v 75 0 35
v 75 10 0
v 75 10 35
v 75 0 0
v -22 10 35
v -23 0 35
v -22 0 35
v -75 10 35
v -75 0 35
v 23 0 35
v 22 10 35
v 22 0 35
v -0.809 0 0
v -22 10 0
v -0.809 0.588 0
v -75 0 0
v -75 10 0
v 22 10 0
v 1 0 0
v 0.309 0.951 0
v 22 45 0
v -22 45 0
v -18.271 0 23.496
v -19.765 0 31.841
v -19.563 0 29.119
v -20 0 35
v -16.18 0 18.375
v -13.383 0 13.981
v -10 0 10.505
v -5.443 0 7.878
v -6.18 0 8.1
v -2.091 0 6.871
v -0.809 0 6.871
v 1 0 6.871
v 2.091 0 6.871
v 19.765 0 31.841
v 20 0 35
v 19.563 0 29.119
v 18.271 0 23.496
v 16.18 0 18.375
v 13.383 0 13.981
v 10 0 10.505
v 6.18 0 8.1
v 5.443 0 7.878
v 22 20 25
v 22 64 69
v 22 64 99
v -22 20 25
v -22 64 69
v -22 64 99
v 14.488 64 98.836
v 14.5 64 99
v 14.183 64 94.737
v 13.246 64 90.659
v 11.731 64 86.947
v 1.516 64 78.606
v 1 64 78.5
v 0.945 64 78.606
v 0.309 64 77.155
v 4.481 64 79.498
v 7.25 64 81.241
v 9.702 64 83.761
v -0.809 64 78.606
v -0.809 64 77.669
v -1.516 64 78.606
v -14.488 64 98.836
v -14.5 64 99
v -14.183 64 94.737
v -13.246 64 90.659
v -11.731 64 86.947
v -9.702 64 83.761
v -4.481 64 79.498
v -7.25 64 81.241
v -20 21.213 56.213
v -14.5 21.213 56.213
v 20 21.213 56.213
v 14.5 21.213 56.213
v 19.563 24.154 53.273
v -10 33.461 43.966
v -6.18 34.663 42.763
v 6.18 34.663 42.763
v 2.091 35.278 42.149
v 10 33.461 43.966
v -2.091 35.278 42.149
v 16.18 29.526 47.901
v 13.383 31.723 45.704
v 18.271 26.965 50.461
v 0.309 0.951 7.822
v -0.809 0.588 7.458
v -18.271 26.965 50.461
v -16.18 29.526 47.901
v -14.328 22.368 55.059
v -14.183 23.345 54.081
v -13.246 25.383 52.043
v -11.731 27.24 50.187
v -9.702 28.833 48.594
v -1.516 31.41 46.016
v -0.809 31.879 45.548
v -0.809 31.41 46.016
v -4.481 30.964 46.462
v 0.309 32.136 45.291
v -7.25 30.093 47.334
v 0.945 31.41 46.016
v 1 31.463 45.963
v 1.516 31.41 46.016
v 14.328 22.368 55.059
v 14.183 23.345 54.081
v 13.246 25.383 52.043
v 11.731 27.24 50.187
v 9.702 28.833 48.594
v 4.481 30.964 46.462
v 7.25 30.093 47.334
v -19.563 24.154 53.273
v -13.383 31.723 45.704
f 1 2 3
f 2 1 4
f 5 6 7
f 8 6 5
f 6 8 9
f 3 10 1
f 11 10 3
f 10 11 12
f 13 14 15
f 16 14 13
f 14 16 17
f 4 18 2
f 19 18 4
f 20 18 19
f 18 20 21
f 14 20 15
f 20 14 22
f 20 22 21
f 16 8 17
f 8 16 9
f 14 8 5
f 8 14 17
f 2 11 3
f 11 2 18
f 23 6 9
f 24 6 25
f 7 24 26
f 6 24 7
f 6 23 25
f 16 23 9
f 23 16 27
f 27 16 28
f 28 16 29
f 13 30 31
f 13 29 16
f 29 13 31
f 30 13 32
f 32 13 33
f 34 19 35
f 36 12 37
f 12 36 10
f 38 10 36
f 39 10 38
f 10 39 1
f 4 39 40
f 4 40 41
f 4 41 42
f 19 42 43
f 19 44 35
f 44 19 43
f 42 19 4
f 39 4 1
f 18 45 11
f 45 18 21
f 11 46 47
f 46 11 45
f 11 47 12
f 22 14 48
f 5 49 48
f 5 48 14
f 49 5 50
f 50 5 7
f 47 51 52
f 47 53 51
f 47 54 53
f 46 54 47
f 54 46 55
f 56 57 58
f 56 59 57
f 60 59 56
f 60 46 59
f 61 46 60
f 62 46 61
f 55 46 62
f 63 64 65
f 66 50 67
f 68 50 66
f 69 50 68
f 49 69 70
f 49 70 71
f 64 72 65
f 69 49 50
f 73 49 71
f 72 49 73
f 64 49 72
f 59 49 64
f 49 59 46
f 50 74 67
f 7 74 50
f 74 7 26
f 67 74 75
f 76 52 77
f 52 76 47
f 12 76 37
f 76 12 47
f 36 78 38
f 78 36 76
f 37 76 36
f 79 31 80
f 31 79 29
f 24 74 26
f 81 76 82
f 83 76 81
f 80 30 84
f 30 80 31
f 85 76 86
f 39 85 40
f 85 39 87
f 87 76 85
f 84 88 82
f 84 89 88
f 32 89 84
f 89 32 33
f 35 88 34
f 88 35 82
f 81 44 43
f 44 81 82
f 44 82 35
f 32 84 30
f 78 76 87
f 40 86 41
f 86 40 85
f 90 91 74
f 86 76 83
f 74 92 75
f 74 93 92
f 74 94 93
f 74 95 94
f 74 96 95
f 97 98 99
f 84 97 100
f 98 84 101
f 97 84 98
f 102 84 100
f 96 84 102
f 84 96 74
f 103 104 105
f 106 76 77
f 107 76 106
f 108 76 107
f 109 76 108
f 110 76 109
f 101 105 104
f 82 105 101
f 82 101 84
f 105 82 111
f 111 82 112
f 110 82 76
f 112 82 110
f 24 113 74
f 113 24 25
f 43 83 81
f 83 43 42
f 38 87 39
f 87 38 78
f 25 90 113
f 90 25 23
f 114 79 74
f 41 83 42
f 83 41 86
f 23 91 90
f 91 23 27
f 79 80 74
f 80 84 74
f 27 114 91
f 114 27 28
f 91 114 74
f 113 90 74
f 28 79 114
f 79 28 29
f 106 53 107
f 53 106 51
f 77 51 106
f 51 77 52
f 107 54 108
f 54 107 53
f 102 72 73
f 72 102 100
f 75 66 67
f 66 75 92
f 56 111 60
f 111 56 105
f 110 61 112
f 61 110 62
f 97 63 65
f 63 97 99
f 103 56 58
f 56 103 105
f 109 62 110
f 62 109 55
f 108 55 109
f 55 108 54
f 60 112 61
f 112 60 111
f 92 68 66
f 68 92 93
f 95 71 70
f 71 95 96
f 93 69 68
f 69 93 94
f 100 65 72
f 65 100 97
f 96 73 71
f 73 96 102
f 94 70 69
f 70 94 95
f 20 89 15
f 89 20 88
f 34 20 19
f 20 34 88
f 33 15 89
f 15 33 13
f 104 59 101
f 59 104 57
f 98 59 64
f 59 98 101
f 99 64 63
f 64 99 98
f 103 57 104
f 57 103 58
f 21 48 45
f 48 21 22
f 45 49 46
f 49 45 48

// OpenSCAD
difference(){
    union(){
        translate([-75,0,0]) cube([150,10,35]);
        translate([-22,0,0]) cube([44,64,100]);
    }
    translate([0,0,35]) rotate([-45,0,0]) 
            translate([-23,-64,0]) cube([46,64,100]);
    translate([0,0,35]) rotate([-45,0,0]) 
            translate([0,0,-30]) cylinder(r=20,h=60);
    translate([0,0,35]) rotate([-45,0,0]) 
            translate([0,0,-25]) cylinder(r=14.5,h=120);
    translate([0,0,-1]) cylinder(r=1,h=20);
    translate([0,0,14.5]) rotate([-45,0,0]) cylinder(r=1,h=150);
    translate([-25,20,25]) rotate([-45,0,0]) cube([50,50,100]);
}
